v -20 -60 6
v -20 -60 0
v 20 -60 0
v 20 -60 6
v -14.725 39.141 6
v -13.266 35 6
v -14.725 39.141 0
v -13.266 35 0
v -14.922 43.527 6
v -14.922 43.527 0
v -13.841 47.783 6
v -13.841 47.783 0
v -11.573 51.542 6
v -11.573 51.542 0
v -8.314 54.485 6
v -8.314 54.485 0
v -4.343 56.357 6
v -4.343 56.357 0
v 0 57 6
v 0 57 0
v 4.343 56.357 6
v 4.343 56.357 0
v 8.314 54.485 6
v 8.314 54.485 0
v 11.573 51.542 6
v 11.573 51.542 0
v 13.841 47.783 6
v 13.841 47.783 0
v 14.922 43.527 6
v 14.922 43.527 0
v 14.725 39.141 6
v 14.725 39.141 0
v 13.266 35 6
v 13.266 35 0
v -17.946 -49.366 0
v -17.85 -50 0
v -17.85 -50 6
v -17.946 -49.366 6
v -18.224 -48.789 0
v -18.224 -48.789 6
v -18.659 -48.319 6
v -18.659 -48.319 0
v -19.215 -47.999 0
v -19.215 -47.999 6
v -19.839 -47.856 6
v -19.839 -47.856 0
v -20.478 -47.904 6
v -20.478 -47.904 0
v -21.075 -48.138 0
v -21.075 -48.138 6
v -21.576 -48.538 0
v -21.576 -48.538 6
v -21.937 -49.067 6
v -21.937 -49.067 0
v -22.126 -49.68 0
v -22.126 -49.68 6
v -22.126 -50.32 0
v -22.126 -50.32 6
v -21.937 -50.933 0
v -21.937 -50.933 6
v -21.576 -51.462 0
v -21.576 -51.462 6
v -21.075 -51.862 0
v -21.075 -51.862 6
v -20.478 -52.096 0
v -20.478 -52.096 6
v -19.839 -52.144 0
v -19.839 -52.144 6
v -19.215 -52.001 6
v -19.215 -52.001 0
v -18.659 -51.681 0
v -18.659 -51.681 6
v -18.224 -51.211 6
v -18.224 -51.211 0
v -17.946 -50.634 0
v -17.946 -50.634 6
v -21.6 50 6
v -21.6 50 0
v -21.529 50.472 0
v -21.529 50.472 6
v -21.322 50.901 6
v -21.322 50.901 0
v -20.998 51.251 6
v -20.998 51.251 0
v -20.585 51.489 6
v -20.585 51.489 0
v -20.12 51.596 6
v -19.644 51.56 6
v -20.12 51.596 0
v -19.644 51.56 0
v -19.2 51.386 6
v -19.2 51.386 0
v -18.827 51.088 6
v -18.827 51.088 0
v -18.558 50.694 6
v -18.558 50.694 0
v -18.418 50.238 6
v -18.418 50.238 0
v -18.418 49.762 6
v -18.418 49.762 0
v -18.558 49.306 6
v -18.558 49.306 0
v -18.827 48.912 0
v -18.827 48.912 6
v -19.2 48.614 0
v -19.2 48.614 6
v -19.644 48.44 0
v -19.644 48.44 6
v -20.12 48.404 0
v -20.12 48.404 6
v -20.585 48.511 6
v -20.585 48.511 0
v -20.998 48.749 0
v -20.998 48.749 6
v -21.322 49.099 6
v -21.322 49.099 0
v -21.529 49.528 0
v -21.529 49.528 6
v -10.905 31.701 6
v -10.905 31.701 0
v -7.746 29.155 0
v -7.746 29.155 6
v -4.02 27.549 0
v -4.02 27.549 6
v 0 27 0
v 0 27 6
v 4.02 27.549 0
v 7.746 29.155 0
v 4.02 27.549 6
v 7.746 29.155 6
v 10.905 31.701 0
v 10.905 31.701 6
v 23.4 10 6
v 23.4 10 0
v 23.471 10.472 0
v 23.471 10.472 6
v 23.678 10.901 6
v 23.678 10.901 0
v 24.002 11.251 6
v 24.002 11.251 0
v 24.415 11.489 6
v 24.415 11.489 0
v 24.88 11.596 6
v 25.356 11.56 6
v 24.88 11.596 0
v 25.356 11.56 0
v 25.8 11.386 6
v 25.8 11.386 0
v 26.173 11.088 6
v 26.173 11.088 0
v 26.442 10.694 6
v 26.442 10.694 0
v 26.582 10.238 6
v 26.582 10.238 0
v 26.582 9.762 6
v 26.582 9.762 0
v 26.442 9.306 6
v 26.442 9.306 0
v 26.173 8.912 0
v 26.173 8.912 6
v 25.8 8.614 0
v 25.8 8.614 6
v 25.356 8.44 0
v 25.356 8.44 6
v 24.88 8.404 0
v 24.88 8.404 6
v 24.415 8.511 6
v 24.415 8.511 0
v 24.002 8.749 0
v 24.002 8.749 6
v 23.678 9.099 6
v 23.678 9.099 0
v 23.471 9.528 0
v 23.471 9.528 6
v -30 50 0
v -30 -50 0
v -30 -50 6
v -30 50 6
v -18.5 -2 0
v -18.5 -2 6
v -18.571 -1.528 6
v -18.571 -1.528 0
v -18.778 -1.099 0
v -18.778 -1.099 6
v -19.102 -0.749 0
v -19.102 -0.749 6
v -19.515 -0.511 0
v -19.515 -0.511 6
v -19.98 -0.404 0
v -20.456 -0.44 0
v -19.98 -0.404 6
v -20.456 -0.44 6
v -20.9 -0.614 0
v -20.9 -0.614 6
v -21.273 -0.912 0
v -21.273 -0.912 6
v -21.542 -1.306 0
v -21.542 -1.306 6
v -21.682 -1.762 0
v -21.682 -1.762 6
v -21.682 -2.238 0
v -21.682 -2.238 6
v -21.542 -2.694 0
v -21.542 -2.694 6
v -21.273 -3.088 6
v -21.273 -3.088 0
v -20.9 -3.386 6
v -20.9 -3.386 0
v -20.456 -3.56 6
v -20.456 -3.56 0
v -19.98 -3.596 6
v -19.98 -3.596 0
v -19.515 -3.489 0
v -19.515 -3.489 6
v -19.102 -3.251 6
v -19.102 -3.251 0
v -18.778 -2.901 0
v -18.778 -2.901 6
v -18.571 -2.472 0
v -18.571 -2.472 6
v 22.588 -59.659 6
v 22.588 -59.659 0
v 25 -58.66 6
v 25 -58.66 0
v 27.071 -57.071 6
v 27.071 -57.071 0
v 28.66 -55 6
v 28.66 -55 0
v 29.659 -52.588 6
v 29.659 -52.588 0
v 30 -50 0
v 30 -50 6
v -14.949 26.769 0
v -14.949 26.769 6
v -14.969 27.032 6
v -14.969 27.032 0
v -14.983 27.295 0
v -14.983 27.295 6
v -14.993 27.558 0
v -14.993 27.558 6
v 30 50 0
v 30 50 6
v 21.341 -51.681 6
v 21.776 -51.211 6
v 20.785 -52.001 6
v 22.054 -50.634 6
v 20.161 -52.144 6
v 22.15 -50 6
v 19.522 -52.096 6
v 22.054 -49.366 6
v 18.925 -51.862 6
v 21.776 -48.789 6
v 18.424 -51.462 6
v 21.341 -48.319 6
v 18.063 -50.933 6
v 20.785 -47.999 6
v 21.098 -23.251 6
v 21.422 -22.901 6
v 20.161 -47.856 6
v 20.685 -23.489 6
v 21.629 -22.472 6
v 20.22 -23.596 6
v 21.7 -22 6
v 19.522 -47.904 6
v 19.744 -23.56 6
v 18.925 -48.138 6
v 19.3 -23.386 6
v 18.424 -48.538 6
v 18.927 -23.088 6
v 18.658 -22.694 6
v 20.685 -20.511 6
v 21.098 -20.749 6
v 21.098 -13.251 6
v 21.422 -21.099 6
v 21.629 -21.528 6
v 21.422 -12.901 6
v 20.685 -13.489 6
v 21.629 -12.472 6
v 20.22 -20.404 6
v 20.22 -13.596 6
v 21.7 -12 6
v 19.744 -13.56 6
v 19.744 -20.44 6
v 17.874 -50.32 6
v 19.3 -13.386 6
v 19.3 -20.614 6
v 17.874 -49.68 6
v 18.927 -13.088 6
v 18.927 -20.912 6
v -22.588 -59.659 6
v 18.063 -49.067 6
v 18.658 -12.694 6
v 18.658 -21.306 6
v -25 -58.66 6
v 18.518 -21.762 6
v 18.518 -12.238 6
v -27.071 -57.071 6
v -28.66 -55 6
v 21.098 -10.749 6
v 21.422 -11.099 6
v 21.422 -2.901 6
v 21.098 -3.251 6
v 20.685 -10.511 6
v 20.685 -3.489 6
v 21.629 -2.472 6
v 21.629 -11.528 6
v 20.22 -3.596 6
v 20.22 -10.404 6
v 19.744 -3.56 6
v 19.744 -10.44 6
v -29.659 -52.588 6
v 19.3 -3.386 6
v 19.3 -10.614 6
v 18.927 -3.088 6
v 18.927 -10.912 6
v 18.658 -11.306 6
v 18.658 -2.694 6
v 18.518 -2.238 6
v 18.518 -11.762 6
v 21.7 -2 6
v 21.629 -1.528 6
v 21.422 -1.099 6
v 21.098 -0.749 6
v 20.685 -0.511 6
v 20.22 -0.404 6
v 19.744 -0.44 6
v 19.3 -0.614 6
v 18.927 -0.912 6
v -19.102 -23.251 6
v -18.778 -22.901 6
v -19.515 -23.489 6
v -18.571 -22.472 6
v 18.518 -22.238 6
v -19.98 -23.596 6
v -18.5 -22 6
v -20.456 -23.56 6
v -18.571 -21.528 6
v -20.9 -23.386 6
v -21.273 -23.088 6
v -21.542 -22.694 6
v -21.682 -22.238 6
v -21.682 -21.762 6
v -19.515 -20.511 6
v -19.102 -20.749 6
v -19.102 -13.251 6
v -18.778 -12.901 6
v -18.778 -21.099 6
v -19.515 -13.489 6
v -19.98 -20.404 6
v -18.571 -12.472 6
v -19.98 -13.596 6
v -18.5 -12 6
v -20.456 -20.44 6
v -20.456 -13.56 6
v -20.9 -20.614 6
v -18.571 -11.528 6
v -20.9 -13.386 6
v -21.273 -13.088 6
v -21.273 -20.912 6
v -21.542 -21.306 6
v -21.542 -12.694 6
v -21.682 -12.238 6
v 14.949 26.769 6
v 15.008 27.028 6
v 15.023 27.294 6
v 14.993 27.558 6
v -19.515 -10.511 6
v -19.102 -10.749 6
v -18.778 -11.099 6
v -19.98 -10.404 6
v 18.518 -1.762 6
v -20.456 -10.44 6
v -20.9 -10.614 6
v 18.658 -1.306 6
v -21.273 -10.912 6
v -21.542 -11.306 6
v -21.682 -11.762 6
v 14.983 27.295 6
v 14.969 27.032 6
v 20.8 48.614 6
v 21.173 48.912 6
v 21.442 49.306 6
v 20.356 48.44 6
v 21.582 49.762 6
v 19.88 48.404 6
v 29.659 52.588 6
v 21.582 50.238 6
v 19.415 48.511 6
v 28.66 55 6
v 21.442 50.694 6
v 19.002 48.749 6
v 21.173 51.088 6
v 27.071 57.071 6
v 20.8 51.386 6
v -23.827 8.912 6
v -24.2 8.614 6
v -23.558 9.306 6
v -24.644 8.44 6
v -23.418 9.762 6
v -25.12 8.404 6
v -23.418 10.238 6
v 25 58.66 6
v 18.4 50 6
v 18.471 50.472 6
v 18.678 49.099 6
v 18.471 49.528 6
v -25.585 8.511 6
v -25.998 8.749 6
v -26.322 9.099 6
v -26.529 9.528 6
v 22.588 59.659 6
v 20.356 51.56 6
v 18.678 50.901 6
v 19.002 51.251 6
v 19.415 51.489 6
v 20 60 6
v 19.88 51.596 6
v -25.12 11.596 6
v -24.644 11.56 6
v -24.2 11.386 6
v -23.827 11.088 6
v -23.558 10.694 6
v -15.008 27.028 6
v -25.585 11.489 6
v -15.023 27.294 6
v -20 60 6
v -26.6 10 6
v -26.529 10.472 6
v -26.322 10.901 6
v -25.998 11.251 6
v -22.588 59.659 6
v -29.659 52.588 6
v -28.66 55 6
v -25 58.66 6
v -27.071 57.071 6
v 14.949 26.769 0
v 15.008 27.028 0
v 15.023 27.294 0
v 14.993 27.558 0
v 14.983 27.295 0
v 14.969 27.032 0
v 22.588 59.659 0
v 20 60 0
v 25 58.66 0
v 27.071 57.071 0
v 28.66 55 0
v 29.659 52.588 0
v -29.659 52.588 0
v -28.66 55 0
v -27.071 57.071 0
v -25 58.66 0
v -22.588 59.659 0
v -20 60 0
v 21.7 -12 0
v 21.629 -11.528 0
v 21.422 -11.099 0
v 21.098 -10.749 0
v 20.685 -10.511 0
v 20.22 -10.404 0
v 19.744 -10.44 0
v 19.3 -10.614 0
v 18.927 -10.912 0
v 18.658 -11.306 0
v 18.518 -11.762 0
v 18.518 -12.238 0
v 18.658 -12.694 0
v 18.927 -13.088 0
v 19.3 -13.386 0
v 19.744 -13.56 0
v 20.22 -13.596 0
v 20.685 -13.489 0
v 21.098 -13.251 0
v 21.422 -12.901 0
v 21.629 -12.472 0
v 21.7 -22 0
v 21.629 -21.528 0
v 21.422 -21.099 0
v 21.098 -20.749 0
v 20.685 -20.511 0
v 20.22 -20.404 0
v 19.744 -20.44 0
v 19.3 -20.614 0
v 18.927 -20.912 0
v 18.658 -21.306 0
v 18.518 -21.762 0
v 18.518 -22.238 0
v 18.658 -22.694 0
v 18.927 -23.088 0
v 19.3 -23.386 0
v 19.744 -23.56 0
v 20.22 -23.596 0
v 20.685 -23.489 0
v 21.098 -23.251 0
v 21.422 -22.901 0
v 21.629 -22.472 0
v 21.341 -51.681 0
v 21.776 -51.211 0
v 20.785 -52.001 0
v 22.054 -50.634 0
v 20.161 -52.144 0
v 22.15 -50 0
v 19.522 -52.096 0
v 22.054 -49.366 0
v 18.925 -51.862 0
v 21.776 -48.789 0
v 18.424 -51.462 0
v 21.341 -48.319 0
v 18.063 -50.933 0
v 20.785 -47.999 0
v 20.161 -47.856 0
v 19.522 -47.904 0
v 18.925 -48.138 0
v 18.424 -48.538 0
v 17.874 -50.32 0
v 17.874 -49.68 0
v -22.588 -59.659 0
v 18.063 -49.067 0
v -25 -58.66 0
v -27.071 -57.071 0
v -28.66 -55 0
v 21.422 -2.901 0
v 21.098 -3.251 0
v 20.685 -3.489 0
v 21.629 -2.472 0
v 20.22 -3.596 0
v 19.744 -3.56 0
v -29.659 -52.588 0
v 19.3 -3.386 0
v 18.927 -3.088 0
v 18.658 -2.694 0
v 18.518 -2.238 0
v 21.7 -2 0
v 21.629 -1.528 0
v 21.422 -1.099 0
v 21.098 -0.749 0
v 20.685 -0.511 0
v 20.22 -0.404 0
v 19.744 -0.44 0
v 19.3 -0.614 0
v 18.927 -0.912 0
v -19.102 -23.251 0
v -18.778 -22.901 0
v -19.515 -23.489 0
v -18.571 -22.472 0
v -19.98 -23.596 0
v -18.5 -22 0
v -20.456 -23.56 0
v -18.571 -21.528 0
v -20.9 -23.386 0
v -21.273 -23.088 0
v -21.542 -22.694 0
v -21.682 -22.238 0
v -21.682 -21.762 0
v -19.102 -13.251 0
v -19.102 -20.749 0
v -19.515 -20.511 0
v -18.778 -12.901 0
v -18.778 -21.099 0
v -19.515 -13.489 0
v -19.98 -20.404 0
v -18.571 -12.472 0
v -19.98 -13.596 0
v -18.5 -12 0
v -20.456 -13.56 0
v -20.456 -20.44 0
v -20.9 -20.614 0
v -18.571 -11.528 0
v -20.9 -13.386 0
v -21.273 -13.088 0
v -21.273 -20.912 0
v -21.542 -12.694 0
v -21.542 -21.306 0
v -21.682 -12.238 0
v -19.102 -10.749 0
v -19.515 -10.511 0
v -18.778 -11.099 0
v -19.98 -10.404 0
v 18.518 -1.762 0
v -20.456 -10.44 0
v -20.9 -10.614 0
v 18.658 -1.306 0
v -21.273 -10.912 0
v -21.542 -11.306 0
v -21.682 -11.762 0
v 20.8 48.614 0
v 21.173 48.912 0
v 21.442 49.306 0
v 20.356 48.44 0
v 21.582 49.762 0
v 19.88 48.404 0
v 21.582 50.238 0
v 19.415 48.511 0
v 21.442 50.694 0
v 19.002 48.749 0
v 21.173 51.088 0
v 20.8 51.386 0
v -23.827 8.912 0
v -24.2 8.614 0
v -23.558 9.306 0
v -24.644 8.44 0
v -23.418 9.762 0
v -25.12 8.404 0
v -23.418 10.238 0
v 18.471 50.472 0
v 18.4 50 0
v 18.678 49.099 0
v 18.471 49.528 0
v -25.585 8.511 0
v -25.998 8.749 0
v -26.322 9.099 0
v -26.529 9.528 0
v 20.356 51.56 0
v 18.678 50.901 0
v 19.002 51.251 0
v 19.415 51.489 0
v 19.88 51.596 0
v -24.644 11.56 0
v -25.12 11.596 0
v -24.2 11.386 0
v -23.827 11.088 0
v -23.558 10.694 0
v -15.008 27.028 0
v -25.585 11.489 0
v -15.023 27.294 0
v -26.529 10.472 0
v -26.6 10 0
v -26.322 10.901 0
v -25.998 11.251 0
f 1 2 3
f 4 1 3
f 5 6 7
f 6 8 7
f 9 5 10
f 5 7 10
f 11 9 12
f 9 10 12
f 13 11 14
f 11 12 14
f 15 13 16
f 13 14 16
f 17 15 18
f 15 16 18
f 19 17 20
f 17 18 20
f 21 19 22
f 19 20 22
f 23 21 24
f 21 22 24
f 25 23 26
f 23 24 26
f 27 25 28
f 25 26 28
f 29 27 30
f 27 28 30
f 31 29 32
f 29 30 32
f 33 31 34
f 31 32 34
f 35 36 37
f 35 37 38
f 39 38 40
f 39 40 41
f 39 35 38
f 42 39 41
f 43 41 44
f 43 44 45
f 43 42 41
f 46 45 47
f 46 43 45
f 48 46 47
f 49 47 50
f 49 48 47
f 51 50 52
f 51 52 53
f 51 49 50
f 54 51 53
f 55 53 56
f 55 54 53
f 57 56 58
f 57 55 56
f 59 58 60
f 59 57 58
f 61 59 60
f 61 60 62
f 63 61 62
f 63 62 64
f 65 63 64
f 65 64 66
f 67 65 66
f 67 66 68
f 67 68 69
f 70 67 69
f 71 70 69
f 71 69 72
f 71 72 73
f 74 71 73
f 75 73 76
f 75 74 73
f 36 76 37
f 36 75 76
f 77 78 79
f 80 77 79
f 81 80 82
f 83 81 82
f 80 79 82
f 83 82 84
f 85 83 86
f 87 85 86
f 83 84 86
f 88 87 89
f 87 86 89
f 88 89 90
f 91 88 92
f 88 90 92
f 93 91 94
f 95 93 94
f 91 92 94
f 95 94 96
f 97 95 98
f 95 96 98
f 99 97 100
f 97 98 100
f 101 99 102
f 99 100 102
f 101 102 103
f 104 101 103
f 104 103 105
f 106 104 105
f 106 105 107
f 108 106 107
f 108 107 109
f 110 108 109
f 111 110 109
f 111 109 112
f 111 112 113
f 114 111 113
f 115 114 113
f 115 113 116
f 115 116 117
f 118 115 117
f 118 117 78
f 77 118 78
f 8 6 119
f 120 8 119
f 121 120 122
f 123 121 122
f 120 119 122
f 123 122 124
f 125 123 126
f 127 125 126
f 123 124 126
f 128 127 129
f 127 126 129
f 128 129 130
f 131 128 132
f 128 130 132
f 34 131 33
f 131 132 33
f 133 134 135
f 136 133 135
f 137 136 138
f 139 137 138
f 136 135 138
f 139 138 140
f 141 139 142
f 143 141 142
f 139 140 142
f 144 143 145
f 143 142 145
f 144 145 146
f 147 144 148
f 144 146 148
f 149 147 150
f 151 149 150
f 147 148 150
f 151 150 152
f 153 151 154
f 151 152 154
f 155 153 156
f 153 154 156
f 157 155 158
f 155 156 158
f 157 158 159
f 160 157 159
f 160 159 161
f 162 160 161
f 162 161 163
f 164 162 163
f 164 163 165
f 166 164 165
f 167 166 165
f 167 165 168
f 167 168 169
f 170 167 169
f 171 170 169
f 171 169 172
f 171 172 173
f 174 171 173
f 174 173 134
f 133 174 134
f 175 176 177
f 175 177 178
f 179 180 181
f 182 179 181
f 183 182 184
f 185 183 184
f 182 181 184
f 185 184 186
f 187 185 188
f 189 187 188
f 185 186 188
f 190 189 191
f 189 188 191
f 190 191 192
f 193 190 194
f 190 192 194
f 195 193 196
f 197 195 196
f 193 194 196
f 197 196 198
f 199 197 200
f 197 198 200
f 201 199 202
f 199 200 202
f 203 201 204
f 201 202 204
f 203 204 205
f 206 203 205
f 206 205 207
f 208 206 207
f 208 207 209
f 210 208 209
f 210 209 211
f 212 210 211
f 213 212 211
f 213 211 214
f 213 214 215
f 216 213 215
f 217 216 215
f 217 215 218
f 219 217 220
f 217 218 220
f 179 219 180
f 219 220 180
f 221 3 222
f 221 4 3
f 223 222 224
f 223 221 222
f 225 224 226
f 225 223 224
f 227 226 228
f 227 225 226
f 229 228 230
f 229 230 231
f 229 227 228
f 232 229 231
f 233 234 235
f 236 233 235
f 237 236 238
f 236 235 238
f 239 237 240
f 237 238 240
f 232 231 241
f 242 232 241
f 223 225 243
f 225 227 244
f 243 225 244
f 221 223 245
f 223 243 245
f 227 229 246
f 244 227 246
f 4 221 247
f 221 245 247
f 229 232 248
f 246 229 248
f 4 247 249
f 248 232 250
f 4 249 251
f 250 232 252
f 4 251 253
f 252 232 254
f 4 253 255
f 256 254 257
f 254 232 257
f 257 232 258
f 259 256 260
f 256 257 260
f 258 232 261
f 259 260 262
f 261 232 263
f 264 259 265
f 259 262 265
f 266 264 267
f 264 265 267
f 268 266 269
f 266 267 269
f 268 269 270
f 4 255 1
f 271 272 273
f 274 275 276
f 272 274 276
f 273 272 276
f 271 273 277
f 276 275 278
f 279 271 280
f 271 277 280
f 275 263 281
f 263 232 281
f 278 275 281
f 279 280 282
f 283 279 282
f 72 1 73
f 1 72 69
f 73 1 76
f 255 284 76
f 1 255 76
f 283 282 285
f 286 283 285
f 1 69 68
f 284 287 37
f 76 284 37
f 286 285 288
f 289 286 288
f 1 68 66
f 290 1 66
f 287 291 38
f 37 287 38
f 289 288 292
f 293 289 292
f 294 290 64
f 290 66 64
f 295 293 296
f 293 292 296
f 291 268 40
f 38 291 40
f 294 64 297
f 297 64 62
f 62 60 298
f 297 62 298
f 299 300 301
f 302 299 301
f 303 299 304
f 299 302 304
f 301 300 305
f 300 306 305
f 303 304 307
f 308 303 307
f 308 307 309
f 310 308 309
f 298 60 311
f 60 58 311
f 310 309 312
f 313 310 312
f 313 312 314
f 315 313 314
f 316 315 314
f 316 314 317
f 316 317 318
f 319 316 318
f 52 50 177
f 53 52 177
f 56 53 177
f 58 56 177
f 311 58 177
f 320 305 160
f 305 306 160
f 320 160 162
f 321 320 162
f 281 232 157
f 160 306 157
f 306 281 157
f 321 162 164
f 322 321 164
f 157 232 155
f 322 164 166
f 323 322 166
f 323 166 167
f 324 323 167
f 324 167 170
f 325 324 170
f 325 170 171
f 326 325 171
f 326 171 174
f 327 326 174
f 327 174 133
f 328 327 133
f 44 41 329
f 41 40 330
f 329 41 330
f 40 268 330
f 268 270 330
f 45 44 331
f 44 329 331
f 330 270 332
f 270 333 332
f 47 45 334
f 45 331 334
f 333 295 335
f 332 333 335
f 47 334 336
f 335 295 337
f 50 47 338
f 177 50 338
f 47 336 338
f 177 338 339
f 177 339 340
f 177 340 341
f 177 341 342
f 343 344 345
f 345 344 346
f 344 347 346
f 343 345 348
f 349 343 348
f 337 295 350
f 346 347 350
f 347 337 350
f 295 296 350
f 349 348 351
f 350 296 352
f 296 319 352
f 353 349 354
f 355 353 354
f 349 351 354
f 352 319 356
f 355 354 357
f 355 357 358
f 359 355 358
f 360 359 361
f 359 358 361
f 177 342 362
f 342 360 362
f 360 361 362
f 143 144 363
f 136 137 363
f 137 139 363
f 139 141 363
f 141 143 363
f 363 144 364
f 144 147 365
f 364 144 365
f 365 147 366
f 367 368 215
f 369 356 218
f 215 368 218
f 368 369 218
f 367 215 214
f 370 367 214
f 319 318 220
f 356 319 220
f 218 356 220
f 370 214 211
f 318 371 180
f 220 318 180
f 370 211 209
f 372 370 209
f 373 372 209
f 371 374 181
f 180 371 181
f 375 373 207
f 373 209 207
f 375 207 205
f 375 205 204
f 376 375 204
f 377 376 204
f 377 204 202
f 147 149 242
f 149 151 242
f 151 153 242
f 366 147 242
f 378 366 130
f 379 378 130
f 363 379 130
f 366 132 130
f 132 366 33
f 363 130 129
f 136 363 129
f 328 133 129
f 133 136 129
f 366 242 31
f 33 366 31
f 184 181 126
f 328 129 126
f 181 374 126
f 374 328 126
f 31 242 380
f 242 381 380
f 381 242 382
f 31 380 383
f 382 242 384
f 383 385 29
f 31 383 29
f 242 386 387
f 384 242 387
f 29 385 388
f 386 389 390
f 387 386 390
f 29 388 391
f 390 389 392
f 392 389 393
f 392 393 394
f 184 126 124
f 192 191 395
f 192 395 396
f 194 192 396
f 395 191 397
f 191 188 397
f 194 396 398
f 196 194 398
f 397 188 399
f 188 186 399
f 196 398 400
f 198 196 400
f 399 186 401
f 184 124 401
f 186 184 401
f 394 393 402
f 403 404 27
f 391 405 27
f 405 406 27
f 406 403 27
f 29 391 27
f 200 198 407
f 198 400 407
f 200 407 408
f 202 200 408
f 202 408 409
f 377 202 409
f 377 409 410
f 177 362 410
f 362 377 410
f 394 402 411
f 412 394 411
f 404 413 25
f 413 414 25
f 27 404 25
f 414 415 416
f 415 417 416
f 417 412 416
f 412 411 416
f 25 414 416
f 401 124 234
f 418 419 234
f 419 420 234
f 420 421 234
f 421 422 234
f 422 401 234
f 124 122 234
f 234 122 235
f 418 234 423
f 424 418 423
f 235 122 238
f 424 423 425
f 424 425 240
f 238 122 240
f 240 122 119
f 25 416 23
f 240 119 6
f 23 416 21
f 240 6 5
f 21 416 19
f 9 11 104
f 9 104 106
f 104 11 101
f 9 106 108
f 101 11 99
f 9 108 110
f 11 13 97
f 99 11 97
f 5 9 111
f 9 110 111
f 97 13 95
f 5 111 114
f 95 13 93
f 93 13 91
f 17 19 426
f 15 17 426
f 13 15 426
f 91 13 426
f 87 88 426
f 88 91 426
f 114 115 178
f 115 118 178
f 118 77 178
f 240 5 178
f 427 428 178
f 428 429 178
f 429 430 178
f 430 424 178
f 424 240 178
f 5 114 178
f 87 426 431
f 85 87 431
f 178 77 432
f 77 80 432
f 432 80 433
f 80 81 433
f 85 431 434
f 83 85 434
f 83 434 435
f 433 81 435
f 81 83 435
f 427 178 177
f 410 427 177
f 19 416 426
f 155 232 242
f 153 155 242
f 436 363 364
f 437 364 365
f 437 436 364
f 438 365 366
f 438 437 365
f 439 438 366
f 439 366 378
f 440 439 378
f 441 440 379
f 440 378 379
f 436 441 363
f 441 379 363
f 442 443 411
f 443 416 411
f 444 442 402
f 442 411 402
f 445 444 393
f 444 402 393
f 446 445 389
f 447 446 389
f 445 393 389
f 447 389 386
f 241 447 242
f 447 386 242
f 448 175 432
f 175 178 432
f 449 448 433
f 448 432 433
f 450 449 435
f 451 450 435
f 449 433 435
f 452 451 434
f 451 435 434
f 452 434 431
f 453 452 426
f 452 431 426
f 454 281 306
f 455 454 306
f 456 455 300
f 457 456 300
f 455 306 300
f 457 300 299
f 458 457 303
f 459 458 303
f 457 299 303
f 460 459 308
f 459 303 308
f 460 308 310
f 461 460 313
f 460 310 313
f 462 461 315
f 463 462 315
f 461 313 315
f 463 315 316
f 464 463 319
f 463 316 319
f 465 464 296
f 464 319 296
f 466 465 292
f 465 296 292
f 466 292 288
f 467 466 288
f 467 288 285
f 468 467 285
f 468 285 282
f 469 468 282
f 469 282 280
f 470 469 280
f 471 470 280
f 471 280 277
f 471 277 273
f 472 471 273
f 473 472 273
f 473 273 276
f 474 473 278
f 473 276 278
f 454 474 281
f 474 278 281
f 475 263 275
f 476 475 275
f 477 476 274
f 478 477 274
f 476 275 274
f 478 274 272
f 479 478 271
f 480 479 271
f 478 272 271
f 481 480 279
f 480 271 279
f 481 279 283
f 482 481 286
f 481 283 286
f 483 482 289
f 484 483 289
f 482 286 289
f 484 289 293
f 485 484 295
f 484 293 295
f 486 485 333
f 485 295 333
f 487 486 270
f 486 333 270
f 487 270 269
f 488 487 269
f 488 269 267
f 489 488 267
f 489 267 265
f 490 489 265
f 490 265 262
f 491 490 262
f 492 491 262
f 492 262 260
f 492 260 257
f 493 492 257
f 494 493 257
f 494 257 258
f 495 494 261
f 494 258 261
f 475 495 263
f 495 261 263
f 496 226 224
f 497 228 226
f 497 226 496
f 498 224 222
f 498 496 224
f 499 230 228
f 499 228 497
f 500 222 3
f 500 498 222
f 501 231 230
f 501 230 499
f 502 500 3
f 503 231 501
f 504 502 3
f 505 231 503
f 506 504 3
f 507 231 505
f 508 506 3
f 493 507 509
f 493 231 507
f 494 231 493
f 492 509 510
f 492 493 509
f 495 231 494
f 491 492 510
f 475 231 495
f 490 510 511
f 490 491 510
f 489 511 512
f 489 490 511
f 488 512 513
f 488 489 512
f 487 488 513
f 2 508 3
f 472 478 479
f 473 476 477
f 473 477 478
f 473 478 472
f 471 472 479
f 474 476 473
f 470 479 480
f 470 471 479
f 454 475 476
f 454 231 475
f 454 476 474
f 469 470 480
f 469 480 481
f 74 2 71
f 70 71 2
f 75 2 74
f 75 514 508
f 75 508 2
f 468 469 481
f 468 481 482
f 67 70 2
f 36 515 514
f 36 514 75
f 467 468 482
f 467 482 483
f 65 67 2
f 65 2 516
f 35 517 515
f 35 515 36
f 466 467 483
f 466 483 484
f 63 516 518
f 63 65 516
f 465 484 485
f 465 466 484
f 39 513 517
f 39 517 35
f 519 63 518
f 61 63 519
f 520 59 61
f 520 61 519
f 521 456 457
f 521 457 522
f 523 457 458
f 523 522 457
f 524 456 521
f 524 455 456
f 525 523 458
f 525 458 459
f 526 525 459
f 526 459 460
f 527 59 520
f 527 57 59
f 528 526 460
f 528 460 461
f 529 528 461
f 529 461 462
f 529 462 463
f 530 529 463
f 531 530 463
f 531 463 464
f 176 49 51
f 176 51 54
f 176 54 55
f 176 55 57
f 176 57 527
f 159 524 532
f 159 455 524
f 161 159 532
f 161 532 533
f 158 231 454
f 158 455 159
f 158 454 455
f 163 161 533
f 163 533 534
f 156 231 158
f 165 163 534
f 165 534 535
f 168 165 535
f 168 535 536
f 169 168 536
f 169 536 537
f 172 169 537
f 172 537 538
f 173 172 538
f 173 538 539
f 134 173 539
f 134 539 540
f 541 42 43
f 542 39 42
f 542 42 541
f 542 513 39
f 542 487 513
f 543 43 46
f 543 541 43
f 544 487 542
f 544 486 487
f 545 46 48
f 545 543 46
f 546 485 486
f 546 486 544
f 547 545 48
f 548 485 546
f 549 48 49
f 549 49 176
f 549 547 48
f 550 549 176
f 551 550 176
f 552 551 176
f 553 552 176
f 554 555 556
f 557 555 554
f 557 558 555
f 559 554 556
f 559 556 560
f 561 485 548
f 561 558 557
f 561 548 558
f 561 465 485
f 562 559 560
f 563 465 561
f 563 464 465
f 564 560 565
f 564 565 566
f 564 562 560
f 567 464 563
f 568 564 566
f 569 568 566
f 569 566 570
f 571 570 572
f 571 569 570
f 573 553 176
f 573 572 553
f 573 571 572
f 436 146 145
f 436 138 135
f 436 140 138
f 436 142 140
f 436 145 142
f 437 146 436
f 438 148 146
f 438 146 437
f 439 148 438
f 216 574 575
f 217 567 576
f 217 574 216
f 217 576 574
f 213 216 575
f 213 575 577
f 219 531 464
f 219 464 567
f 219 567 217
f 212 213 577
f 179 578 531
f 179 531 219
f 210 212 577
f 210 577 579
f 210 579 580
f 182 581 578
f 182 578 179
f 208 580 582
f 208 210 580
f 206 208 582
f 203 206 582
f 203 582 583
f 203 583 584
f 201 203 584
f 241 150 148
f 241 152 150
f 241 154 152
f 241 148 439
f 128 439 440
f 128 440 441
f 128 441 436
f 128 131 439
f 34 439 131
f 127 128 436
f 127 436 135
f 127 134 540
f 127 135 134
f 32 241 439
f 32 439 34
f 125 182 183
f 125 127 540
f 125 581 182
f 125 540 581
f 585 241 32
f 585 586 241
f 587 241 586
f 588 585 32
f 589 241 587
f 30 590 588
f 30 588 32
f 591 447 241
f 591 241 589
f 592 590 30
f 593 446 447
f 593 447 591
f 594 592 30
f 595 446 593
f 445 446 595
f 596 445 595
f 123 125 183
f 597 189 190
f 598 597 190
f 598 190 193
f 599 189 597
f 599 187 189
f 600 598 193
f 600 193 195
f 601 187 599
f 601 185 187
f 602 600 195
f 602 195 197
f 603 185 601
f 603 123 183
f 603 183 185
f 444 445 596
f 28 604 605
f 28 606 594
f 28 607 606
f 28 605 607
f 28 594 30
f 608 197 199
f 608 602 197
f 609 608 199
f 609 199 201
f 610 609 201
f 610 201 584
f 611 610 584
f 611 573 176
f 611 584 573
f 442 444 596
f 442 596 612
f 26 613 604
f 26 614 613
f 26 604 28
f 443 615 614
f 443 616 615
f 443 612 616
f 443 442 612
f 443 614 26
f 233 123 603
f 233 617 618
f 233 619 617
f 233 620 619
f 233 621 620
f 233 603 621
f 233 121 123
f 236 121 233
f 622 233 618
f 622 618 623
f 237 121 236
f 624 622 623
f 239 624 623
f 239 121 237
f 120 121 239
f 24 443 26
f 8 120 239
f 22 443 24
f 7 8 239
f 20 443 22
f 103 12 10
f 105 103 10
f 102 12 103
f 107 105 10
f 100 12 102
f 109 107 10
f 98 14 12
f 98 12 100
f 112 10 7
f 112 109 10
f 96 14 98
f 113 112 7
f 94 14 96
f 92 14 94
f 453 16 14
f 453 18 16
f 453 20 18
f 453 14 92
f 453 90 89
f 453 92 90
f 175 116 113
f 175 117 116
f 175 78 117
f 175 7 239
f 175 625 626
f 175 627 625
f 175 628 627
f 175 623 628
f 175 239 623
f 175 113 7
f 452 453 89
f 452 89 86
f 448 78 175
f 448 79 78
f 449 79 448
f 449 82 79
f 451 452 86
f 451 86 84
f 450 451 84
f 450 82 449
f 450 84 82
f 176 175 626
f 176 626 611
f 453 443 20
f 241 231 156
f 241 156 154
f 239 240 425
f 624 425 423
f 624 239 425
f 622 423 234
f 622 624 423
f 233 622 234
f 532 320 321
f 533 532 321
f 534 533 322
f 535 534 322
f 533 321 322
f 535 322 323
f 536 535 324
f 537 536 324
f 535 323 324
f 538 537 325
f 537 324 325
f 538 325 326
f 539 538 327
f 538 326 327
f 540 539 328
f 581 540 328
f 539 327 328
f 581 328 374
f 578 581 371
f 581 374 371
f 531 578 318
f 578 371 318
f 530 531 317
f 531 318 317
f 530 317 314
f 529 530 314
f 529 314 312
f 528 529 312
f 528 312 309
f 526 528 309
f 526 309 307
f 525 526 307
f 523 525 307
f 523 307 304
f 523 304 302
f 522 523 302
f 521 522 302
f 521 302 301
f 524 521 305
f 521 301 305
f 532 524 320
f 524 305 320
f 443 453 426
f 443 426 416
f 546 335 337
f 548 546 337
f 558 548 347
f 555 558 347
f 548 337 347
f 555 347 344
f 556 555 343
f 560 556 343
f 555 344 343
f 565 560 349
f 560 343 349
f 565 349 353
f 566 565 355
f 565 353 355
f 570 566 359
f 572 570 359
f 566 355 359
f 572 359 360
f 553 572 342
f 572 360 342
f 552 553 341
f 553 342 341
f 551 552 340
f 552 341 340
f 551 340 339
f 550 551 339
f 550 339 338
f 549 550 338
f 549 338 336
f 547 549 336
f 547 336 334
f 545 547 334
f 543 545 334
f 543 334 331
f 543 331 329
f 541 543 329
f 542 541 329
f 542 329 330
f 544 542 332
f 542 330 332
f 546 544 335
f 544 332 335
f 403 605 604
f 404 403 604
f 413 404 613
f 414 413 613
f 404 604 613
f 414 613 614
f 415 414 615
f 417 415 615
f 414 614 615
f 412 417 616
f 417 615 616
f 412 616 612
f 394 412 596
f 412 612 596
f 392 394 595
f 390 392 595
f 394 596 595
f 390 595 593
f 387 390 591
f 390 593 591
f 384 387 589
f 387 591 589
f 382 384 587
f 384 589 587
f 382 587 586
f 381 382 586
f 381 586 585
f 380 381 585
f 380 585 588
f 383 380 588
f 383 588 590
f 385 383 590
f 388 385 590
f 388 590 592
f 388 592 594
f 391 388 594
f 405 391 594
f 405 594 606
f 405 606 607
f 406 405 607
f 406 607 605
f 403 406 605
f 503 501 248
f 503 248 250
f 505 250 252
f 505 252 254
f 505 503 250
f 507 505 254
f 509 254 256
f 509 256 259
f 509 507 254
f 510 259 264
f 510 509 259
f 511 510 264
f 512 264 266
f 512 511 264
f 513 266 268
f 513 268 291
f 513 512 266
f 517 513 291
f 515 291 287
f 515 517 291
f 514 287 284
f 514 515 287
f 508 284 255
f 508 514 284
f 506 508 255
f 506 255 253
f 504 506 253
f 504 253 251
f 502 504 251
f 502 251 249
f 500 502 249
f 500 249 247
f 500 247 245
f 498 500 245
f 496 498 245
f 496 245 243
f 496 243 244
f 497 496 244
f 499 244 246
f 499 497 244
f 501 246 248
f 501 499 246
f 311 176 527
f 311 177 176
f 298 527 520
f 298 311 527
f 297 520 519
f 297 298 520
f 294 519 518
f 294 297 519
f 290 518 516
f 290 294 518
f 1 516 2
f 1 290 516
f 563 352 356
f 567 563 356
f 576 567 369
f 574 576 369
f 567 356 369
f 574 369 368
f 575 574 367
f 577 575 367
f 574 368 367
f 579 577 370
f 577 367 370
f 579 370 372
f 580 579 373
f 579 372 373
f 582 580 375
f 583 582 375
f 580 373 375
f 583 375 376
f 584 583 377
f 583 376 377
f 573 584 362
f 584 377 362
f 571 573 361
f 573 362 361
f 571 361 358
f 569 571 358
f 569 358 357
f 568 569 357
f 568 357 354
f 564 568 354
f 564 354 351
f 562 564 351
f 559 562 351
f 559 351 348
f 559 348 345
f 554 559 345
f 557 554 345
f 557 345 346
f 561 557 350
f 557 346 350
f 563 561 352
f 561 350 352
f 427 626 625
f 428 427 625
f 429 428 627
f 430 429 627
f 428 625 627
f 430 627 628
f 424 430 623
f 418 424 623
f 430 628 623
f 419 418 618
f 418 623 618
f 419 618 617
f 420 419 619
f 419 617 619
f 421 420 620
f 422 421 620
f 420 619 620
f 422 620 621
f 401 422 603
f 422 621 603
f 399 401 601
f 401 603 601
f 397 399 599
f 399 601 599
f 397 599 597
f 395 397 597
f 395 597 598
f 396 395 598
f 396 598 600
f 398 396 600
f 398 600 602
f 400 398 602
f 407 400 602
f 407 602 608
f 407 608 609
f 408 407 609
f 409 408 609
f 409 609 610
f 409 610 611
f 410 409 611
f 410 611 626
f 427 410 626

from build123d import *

# Parameters (mm, degrees)
SKETCH_1_W          = 60
SKETCH_1_H          = 120
SKETCH_1_R          = 1.6
SKETCH_1_R_2        = 2.15
EXTRUDE_3_DEPTH     = 6
SKETCH_9_R          = 1.6
CUT_EXTRUDE_1_DEPTH = 6
FILLET_1_R          = 10
SKETCH_10_R         = 1.6
CUT_EXTRUDE_2_DEPTH = 10
SKETCH_11_R         = 15
CUT_EXTRUDE_3_DEPTH = 10
EXTRUDE_START       = -6
SKETCH_12_R         = 1.6
EXTRUDE_4_DEPTH     = 6
EXTRUDE_5_DEPTH     = 6
SKETCH_14_R         = 15
CUT_EXTRUDE_4_DEPTH = 68.349832962


with BuildPart() as part:
    # 草图1 → 凸台-拉伸3 (new body)
    with BuildSketch(Plane.XY):
        Rectangle(SKETCH_1_W, SKETCH_1_H)
        with Locations((0, 50.5)):
            Circle(SKETCH_1_R, mode=Mode.SUBTRACT)
        with Locations((20, -50)):
            Circle(SKETCH_1_R_2, mode=Mode.SUBTRACT)
        with Locations((-20, -50)):
            Circle(SKETCH_1_R_2, mode=Mode.SUBTRACT)
        with Locations((13.423393759, 42.75)):
            Circle(SKETCH_1_R, mode=Mode.SUBTRACT)
        with Locations((13.423393759, 27.25)):
            Circle(SKETCH_1_R, mode=Mode.SUBTRACT)
        with Locations((0, 19.5)):
            Circle(SKETCH_1_R, mode=Mode.SUBTRACT)
        with Locations((-13.423393759, 27.25)):
            Circle(SKETCH_1_R, mode=Mode.SUBTRACT)
        with Locations((-13.423393759, 42.75)):
            Circle(SKETCH_1_R, mode=Mode.SUBTRACT)
        with BuildLine():
            Line((6, 42), (6, 28))
            ThreePointArc((6, 28), (0, 22), (-6, 28))
            Line((-6, 28), (-6, 42))
            ThreePointArc((-6, 42), (0, 48), (6, 42))
        make_face(mode=Mode.SUBTRACT)
    extrude(amount=EXTRUDE_3_DEPTH)

    # 草图9 → 切除-拉伸1 (cut)
    with BuildSketch(Plane.XY.offset(6)):
        with Locations((20.1, -22)):
            Circle(SKETCH_9_R)
        with Locations((20.1, -2)):
            Circle(SKETCH_9_R)
        with Locations((20.1, -12)):
            Circle(SKETCH_9_R)
        with Locations((-20.1, -2)):
            Circle(SKETCH_9_R)
        with Locations((-20.1, -12)):
            Circle(SKETCH_9_R)
        with Locations((-20.1, -22)):
            Circle(SKETCH_9_R)
    extrude(amount=-CUT_EXTRUDE_1_DEPTH, mode=Mode.SUBTRACT)

    # 圆角1
    fillet_1_edges = [part.edges().sort_by_distance(p)[0] for p in [
        (30, -60, 3),
        (-30, -60, 3),
        (-30, 60, 3),
        (30, 60, 3),
    ]]
    fillet(fillet_1_edges, radius=FILLET_1_R)

    # 草图10 → 切除-拉伸2 (cut)
    with BuildSketch(Plane(origin=(0, 0, 0), x_dir=(-1, 0, 0), z_dir=(0, 0, -1))):
        with Locations((-20, 50)):
            Circle(SKETCH_10_R)
        with Locations((-25, 10)):
            Circle(SKETCH_10_R)
        with Locations((25, 10)):
            Circle(SKETCH_10_R)
        with Locations((20, 50)):
            Circle(SKETCH_10_R)
    extrude(amount=-CUT_EXTRUDE_2_DEPTH, mode=Mode.SUBTRACT)

    # 草图11 → 切除-拉伸3 (cut)
    with BuildSketch(Plane.XY.offset(6)):
        with Locations((0, 28)):
            Circle(SKETCH_11_R)
    extrude(amount=-CUT_EXTRUDE_3_DEPTH, mode=Mode.SUBTRACT)

    # 草图12 → 凸台-拉伸4 (add)
    with BuildSketch(Plane.XY.offset(6).offset(EXTRUDE_START)):
        with BuildLine():
            ThreePointArc((5.994789404, 41.75), (5.99869721, 41.874972853), (6, 42))
            ThreePointArc((6, 42), (0, 48), (-6, 42))
            ThreePointArc((-6, 42), (-5.99869721, 41.874972853), (-5.994789404, 41.75))
            ThreePointArc((-5.994789404, 41.75), (0, 43), (5.994789404, 41.75))
        make_face()
        with Locations((-13.423393759, 42.75)):
            Circle(SKETCH_12_R)
        with Locations((0, 50.5)):
            Circle(SKETCH_12_R)
        with Locations((13.423393759, 42.75)):
            Circle(SKETCH_12_R)
    extrude(amount=EXTRUDE_4_DEPTH)

    # 草图13 → 凸台-拉伸5 (add)
    with BuildSketch(Plane(origin=(0, 0, 0), x_dir=(-1, 0, 0), z_dir=(0, 0, -1)).offset(EXTRUDE_START)):
        with BuildLine():
            ThreePointArc((13.266499161, 35), (0, 27), (-13.266499161, 35))
            ThreePointArc((-13.266499161, 35), (-14.611734824, 31.390752932), (-14.993484161, 27.557922277))
            ThreePointArc((-14.993484161, 27.557922277), (-14.976641564, 27.163215996), (-14.949410055, 26.769090172))
            ThreePointArc((-14.949410055, 26.769090172), (0, 13), (14.949410055, 26.769090172))
            ThreePointArc((14.949410055, 26.769090172), (14.976641564, 27.163215996), (14.993484161, 27.557922277))
            ThreePointArc((14.993484161, 27.557922277), (14.998370952, 27.77893713), (15, 28))
            ThreePointArc((15, 28), (14.560176637, 31.605725487), (13.266499161, 35))
        make_face()
    extrude(amount=EXTRUDE_5_DEPTH)

    # 草图14 → 切除-拉伸4 (cut, through all)
    with BuildSketch(Plane(origin=(0, 0, 0), x_dir=(-1, 0, 0), z_dir=(0, 0, -1))):
        with Locations((0, 42)):
            Circle(SKETCH_14_R)
    extrude(amount=-CUT_EXTRUDE_4_DEPTH, mode=Mode.SUBTRACT)


solid = part.part
